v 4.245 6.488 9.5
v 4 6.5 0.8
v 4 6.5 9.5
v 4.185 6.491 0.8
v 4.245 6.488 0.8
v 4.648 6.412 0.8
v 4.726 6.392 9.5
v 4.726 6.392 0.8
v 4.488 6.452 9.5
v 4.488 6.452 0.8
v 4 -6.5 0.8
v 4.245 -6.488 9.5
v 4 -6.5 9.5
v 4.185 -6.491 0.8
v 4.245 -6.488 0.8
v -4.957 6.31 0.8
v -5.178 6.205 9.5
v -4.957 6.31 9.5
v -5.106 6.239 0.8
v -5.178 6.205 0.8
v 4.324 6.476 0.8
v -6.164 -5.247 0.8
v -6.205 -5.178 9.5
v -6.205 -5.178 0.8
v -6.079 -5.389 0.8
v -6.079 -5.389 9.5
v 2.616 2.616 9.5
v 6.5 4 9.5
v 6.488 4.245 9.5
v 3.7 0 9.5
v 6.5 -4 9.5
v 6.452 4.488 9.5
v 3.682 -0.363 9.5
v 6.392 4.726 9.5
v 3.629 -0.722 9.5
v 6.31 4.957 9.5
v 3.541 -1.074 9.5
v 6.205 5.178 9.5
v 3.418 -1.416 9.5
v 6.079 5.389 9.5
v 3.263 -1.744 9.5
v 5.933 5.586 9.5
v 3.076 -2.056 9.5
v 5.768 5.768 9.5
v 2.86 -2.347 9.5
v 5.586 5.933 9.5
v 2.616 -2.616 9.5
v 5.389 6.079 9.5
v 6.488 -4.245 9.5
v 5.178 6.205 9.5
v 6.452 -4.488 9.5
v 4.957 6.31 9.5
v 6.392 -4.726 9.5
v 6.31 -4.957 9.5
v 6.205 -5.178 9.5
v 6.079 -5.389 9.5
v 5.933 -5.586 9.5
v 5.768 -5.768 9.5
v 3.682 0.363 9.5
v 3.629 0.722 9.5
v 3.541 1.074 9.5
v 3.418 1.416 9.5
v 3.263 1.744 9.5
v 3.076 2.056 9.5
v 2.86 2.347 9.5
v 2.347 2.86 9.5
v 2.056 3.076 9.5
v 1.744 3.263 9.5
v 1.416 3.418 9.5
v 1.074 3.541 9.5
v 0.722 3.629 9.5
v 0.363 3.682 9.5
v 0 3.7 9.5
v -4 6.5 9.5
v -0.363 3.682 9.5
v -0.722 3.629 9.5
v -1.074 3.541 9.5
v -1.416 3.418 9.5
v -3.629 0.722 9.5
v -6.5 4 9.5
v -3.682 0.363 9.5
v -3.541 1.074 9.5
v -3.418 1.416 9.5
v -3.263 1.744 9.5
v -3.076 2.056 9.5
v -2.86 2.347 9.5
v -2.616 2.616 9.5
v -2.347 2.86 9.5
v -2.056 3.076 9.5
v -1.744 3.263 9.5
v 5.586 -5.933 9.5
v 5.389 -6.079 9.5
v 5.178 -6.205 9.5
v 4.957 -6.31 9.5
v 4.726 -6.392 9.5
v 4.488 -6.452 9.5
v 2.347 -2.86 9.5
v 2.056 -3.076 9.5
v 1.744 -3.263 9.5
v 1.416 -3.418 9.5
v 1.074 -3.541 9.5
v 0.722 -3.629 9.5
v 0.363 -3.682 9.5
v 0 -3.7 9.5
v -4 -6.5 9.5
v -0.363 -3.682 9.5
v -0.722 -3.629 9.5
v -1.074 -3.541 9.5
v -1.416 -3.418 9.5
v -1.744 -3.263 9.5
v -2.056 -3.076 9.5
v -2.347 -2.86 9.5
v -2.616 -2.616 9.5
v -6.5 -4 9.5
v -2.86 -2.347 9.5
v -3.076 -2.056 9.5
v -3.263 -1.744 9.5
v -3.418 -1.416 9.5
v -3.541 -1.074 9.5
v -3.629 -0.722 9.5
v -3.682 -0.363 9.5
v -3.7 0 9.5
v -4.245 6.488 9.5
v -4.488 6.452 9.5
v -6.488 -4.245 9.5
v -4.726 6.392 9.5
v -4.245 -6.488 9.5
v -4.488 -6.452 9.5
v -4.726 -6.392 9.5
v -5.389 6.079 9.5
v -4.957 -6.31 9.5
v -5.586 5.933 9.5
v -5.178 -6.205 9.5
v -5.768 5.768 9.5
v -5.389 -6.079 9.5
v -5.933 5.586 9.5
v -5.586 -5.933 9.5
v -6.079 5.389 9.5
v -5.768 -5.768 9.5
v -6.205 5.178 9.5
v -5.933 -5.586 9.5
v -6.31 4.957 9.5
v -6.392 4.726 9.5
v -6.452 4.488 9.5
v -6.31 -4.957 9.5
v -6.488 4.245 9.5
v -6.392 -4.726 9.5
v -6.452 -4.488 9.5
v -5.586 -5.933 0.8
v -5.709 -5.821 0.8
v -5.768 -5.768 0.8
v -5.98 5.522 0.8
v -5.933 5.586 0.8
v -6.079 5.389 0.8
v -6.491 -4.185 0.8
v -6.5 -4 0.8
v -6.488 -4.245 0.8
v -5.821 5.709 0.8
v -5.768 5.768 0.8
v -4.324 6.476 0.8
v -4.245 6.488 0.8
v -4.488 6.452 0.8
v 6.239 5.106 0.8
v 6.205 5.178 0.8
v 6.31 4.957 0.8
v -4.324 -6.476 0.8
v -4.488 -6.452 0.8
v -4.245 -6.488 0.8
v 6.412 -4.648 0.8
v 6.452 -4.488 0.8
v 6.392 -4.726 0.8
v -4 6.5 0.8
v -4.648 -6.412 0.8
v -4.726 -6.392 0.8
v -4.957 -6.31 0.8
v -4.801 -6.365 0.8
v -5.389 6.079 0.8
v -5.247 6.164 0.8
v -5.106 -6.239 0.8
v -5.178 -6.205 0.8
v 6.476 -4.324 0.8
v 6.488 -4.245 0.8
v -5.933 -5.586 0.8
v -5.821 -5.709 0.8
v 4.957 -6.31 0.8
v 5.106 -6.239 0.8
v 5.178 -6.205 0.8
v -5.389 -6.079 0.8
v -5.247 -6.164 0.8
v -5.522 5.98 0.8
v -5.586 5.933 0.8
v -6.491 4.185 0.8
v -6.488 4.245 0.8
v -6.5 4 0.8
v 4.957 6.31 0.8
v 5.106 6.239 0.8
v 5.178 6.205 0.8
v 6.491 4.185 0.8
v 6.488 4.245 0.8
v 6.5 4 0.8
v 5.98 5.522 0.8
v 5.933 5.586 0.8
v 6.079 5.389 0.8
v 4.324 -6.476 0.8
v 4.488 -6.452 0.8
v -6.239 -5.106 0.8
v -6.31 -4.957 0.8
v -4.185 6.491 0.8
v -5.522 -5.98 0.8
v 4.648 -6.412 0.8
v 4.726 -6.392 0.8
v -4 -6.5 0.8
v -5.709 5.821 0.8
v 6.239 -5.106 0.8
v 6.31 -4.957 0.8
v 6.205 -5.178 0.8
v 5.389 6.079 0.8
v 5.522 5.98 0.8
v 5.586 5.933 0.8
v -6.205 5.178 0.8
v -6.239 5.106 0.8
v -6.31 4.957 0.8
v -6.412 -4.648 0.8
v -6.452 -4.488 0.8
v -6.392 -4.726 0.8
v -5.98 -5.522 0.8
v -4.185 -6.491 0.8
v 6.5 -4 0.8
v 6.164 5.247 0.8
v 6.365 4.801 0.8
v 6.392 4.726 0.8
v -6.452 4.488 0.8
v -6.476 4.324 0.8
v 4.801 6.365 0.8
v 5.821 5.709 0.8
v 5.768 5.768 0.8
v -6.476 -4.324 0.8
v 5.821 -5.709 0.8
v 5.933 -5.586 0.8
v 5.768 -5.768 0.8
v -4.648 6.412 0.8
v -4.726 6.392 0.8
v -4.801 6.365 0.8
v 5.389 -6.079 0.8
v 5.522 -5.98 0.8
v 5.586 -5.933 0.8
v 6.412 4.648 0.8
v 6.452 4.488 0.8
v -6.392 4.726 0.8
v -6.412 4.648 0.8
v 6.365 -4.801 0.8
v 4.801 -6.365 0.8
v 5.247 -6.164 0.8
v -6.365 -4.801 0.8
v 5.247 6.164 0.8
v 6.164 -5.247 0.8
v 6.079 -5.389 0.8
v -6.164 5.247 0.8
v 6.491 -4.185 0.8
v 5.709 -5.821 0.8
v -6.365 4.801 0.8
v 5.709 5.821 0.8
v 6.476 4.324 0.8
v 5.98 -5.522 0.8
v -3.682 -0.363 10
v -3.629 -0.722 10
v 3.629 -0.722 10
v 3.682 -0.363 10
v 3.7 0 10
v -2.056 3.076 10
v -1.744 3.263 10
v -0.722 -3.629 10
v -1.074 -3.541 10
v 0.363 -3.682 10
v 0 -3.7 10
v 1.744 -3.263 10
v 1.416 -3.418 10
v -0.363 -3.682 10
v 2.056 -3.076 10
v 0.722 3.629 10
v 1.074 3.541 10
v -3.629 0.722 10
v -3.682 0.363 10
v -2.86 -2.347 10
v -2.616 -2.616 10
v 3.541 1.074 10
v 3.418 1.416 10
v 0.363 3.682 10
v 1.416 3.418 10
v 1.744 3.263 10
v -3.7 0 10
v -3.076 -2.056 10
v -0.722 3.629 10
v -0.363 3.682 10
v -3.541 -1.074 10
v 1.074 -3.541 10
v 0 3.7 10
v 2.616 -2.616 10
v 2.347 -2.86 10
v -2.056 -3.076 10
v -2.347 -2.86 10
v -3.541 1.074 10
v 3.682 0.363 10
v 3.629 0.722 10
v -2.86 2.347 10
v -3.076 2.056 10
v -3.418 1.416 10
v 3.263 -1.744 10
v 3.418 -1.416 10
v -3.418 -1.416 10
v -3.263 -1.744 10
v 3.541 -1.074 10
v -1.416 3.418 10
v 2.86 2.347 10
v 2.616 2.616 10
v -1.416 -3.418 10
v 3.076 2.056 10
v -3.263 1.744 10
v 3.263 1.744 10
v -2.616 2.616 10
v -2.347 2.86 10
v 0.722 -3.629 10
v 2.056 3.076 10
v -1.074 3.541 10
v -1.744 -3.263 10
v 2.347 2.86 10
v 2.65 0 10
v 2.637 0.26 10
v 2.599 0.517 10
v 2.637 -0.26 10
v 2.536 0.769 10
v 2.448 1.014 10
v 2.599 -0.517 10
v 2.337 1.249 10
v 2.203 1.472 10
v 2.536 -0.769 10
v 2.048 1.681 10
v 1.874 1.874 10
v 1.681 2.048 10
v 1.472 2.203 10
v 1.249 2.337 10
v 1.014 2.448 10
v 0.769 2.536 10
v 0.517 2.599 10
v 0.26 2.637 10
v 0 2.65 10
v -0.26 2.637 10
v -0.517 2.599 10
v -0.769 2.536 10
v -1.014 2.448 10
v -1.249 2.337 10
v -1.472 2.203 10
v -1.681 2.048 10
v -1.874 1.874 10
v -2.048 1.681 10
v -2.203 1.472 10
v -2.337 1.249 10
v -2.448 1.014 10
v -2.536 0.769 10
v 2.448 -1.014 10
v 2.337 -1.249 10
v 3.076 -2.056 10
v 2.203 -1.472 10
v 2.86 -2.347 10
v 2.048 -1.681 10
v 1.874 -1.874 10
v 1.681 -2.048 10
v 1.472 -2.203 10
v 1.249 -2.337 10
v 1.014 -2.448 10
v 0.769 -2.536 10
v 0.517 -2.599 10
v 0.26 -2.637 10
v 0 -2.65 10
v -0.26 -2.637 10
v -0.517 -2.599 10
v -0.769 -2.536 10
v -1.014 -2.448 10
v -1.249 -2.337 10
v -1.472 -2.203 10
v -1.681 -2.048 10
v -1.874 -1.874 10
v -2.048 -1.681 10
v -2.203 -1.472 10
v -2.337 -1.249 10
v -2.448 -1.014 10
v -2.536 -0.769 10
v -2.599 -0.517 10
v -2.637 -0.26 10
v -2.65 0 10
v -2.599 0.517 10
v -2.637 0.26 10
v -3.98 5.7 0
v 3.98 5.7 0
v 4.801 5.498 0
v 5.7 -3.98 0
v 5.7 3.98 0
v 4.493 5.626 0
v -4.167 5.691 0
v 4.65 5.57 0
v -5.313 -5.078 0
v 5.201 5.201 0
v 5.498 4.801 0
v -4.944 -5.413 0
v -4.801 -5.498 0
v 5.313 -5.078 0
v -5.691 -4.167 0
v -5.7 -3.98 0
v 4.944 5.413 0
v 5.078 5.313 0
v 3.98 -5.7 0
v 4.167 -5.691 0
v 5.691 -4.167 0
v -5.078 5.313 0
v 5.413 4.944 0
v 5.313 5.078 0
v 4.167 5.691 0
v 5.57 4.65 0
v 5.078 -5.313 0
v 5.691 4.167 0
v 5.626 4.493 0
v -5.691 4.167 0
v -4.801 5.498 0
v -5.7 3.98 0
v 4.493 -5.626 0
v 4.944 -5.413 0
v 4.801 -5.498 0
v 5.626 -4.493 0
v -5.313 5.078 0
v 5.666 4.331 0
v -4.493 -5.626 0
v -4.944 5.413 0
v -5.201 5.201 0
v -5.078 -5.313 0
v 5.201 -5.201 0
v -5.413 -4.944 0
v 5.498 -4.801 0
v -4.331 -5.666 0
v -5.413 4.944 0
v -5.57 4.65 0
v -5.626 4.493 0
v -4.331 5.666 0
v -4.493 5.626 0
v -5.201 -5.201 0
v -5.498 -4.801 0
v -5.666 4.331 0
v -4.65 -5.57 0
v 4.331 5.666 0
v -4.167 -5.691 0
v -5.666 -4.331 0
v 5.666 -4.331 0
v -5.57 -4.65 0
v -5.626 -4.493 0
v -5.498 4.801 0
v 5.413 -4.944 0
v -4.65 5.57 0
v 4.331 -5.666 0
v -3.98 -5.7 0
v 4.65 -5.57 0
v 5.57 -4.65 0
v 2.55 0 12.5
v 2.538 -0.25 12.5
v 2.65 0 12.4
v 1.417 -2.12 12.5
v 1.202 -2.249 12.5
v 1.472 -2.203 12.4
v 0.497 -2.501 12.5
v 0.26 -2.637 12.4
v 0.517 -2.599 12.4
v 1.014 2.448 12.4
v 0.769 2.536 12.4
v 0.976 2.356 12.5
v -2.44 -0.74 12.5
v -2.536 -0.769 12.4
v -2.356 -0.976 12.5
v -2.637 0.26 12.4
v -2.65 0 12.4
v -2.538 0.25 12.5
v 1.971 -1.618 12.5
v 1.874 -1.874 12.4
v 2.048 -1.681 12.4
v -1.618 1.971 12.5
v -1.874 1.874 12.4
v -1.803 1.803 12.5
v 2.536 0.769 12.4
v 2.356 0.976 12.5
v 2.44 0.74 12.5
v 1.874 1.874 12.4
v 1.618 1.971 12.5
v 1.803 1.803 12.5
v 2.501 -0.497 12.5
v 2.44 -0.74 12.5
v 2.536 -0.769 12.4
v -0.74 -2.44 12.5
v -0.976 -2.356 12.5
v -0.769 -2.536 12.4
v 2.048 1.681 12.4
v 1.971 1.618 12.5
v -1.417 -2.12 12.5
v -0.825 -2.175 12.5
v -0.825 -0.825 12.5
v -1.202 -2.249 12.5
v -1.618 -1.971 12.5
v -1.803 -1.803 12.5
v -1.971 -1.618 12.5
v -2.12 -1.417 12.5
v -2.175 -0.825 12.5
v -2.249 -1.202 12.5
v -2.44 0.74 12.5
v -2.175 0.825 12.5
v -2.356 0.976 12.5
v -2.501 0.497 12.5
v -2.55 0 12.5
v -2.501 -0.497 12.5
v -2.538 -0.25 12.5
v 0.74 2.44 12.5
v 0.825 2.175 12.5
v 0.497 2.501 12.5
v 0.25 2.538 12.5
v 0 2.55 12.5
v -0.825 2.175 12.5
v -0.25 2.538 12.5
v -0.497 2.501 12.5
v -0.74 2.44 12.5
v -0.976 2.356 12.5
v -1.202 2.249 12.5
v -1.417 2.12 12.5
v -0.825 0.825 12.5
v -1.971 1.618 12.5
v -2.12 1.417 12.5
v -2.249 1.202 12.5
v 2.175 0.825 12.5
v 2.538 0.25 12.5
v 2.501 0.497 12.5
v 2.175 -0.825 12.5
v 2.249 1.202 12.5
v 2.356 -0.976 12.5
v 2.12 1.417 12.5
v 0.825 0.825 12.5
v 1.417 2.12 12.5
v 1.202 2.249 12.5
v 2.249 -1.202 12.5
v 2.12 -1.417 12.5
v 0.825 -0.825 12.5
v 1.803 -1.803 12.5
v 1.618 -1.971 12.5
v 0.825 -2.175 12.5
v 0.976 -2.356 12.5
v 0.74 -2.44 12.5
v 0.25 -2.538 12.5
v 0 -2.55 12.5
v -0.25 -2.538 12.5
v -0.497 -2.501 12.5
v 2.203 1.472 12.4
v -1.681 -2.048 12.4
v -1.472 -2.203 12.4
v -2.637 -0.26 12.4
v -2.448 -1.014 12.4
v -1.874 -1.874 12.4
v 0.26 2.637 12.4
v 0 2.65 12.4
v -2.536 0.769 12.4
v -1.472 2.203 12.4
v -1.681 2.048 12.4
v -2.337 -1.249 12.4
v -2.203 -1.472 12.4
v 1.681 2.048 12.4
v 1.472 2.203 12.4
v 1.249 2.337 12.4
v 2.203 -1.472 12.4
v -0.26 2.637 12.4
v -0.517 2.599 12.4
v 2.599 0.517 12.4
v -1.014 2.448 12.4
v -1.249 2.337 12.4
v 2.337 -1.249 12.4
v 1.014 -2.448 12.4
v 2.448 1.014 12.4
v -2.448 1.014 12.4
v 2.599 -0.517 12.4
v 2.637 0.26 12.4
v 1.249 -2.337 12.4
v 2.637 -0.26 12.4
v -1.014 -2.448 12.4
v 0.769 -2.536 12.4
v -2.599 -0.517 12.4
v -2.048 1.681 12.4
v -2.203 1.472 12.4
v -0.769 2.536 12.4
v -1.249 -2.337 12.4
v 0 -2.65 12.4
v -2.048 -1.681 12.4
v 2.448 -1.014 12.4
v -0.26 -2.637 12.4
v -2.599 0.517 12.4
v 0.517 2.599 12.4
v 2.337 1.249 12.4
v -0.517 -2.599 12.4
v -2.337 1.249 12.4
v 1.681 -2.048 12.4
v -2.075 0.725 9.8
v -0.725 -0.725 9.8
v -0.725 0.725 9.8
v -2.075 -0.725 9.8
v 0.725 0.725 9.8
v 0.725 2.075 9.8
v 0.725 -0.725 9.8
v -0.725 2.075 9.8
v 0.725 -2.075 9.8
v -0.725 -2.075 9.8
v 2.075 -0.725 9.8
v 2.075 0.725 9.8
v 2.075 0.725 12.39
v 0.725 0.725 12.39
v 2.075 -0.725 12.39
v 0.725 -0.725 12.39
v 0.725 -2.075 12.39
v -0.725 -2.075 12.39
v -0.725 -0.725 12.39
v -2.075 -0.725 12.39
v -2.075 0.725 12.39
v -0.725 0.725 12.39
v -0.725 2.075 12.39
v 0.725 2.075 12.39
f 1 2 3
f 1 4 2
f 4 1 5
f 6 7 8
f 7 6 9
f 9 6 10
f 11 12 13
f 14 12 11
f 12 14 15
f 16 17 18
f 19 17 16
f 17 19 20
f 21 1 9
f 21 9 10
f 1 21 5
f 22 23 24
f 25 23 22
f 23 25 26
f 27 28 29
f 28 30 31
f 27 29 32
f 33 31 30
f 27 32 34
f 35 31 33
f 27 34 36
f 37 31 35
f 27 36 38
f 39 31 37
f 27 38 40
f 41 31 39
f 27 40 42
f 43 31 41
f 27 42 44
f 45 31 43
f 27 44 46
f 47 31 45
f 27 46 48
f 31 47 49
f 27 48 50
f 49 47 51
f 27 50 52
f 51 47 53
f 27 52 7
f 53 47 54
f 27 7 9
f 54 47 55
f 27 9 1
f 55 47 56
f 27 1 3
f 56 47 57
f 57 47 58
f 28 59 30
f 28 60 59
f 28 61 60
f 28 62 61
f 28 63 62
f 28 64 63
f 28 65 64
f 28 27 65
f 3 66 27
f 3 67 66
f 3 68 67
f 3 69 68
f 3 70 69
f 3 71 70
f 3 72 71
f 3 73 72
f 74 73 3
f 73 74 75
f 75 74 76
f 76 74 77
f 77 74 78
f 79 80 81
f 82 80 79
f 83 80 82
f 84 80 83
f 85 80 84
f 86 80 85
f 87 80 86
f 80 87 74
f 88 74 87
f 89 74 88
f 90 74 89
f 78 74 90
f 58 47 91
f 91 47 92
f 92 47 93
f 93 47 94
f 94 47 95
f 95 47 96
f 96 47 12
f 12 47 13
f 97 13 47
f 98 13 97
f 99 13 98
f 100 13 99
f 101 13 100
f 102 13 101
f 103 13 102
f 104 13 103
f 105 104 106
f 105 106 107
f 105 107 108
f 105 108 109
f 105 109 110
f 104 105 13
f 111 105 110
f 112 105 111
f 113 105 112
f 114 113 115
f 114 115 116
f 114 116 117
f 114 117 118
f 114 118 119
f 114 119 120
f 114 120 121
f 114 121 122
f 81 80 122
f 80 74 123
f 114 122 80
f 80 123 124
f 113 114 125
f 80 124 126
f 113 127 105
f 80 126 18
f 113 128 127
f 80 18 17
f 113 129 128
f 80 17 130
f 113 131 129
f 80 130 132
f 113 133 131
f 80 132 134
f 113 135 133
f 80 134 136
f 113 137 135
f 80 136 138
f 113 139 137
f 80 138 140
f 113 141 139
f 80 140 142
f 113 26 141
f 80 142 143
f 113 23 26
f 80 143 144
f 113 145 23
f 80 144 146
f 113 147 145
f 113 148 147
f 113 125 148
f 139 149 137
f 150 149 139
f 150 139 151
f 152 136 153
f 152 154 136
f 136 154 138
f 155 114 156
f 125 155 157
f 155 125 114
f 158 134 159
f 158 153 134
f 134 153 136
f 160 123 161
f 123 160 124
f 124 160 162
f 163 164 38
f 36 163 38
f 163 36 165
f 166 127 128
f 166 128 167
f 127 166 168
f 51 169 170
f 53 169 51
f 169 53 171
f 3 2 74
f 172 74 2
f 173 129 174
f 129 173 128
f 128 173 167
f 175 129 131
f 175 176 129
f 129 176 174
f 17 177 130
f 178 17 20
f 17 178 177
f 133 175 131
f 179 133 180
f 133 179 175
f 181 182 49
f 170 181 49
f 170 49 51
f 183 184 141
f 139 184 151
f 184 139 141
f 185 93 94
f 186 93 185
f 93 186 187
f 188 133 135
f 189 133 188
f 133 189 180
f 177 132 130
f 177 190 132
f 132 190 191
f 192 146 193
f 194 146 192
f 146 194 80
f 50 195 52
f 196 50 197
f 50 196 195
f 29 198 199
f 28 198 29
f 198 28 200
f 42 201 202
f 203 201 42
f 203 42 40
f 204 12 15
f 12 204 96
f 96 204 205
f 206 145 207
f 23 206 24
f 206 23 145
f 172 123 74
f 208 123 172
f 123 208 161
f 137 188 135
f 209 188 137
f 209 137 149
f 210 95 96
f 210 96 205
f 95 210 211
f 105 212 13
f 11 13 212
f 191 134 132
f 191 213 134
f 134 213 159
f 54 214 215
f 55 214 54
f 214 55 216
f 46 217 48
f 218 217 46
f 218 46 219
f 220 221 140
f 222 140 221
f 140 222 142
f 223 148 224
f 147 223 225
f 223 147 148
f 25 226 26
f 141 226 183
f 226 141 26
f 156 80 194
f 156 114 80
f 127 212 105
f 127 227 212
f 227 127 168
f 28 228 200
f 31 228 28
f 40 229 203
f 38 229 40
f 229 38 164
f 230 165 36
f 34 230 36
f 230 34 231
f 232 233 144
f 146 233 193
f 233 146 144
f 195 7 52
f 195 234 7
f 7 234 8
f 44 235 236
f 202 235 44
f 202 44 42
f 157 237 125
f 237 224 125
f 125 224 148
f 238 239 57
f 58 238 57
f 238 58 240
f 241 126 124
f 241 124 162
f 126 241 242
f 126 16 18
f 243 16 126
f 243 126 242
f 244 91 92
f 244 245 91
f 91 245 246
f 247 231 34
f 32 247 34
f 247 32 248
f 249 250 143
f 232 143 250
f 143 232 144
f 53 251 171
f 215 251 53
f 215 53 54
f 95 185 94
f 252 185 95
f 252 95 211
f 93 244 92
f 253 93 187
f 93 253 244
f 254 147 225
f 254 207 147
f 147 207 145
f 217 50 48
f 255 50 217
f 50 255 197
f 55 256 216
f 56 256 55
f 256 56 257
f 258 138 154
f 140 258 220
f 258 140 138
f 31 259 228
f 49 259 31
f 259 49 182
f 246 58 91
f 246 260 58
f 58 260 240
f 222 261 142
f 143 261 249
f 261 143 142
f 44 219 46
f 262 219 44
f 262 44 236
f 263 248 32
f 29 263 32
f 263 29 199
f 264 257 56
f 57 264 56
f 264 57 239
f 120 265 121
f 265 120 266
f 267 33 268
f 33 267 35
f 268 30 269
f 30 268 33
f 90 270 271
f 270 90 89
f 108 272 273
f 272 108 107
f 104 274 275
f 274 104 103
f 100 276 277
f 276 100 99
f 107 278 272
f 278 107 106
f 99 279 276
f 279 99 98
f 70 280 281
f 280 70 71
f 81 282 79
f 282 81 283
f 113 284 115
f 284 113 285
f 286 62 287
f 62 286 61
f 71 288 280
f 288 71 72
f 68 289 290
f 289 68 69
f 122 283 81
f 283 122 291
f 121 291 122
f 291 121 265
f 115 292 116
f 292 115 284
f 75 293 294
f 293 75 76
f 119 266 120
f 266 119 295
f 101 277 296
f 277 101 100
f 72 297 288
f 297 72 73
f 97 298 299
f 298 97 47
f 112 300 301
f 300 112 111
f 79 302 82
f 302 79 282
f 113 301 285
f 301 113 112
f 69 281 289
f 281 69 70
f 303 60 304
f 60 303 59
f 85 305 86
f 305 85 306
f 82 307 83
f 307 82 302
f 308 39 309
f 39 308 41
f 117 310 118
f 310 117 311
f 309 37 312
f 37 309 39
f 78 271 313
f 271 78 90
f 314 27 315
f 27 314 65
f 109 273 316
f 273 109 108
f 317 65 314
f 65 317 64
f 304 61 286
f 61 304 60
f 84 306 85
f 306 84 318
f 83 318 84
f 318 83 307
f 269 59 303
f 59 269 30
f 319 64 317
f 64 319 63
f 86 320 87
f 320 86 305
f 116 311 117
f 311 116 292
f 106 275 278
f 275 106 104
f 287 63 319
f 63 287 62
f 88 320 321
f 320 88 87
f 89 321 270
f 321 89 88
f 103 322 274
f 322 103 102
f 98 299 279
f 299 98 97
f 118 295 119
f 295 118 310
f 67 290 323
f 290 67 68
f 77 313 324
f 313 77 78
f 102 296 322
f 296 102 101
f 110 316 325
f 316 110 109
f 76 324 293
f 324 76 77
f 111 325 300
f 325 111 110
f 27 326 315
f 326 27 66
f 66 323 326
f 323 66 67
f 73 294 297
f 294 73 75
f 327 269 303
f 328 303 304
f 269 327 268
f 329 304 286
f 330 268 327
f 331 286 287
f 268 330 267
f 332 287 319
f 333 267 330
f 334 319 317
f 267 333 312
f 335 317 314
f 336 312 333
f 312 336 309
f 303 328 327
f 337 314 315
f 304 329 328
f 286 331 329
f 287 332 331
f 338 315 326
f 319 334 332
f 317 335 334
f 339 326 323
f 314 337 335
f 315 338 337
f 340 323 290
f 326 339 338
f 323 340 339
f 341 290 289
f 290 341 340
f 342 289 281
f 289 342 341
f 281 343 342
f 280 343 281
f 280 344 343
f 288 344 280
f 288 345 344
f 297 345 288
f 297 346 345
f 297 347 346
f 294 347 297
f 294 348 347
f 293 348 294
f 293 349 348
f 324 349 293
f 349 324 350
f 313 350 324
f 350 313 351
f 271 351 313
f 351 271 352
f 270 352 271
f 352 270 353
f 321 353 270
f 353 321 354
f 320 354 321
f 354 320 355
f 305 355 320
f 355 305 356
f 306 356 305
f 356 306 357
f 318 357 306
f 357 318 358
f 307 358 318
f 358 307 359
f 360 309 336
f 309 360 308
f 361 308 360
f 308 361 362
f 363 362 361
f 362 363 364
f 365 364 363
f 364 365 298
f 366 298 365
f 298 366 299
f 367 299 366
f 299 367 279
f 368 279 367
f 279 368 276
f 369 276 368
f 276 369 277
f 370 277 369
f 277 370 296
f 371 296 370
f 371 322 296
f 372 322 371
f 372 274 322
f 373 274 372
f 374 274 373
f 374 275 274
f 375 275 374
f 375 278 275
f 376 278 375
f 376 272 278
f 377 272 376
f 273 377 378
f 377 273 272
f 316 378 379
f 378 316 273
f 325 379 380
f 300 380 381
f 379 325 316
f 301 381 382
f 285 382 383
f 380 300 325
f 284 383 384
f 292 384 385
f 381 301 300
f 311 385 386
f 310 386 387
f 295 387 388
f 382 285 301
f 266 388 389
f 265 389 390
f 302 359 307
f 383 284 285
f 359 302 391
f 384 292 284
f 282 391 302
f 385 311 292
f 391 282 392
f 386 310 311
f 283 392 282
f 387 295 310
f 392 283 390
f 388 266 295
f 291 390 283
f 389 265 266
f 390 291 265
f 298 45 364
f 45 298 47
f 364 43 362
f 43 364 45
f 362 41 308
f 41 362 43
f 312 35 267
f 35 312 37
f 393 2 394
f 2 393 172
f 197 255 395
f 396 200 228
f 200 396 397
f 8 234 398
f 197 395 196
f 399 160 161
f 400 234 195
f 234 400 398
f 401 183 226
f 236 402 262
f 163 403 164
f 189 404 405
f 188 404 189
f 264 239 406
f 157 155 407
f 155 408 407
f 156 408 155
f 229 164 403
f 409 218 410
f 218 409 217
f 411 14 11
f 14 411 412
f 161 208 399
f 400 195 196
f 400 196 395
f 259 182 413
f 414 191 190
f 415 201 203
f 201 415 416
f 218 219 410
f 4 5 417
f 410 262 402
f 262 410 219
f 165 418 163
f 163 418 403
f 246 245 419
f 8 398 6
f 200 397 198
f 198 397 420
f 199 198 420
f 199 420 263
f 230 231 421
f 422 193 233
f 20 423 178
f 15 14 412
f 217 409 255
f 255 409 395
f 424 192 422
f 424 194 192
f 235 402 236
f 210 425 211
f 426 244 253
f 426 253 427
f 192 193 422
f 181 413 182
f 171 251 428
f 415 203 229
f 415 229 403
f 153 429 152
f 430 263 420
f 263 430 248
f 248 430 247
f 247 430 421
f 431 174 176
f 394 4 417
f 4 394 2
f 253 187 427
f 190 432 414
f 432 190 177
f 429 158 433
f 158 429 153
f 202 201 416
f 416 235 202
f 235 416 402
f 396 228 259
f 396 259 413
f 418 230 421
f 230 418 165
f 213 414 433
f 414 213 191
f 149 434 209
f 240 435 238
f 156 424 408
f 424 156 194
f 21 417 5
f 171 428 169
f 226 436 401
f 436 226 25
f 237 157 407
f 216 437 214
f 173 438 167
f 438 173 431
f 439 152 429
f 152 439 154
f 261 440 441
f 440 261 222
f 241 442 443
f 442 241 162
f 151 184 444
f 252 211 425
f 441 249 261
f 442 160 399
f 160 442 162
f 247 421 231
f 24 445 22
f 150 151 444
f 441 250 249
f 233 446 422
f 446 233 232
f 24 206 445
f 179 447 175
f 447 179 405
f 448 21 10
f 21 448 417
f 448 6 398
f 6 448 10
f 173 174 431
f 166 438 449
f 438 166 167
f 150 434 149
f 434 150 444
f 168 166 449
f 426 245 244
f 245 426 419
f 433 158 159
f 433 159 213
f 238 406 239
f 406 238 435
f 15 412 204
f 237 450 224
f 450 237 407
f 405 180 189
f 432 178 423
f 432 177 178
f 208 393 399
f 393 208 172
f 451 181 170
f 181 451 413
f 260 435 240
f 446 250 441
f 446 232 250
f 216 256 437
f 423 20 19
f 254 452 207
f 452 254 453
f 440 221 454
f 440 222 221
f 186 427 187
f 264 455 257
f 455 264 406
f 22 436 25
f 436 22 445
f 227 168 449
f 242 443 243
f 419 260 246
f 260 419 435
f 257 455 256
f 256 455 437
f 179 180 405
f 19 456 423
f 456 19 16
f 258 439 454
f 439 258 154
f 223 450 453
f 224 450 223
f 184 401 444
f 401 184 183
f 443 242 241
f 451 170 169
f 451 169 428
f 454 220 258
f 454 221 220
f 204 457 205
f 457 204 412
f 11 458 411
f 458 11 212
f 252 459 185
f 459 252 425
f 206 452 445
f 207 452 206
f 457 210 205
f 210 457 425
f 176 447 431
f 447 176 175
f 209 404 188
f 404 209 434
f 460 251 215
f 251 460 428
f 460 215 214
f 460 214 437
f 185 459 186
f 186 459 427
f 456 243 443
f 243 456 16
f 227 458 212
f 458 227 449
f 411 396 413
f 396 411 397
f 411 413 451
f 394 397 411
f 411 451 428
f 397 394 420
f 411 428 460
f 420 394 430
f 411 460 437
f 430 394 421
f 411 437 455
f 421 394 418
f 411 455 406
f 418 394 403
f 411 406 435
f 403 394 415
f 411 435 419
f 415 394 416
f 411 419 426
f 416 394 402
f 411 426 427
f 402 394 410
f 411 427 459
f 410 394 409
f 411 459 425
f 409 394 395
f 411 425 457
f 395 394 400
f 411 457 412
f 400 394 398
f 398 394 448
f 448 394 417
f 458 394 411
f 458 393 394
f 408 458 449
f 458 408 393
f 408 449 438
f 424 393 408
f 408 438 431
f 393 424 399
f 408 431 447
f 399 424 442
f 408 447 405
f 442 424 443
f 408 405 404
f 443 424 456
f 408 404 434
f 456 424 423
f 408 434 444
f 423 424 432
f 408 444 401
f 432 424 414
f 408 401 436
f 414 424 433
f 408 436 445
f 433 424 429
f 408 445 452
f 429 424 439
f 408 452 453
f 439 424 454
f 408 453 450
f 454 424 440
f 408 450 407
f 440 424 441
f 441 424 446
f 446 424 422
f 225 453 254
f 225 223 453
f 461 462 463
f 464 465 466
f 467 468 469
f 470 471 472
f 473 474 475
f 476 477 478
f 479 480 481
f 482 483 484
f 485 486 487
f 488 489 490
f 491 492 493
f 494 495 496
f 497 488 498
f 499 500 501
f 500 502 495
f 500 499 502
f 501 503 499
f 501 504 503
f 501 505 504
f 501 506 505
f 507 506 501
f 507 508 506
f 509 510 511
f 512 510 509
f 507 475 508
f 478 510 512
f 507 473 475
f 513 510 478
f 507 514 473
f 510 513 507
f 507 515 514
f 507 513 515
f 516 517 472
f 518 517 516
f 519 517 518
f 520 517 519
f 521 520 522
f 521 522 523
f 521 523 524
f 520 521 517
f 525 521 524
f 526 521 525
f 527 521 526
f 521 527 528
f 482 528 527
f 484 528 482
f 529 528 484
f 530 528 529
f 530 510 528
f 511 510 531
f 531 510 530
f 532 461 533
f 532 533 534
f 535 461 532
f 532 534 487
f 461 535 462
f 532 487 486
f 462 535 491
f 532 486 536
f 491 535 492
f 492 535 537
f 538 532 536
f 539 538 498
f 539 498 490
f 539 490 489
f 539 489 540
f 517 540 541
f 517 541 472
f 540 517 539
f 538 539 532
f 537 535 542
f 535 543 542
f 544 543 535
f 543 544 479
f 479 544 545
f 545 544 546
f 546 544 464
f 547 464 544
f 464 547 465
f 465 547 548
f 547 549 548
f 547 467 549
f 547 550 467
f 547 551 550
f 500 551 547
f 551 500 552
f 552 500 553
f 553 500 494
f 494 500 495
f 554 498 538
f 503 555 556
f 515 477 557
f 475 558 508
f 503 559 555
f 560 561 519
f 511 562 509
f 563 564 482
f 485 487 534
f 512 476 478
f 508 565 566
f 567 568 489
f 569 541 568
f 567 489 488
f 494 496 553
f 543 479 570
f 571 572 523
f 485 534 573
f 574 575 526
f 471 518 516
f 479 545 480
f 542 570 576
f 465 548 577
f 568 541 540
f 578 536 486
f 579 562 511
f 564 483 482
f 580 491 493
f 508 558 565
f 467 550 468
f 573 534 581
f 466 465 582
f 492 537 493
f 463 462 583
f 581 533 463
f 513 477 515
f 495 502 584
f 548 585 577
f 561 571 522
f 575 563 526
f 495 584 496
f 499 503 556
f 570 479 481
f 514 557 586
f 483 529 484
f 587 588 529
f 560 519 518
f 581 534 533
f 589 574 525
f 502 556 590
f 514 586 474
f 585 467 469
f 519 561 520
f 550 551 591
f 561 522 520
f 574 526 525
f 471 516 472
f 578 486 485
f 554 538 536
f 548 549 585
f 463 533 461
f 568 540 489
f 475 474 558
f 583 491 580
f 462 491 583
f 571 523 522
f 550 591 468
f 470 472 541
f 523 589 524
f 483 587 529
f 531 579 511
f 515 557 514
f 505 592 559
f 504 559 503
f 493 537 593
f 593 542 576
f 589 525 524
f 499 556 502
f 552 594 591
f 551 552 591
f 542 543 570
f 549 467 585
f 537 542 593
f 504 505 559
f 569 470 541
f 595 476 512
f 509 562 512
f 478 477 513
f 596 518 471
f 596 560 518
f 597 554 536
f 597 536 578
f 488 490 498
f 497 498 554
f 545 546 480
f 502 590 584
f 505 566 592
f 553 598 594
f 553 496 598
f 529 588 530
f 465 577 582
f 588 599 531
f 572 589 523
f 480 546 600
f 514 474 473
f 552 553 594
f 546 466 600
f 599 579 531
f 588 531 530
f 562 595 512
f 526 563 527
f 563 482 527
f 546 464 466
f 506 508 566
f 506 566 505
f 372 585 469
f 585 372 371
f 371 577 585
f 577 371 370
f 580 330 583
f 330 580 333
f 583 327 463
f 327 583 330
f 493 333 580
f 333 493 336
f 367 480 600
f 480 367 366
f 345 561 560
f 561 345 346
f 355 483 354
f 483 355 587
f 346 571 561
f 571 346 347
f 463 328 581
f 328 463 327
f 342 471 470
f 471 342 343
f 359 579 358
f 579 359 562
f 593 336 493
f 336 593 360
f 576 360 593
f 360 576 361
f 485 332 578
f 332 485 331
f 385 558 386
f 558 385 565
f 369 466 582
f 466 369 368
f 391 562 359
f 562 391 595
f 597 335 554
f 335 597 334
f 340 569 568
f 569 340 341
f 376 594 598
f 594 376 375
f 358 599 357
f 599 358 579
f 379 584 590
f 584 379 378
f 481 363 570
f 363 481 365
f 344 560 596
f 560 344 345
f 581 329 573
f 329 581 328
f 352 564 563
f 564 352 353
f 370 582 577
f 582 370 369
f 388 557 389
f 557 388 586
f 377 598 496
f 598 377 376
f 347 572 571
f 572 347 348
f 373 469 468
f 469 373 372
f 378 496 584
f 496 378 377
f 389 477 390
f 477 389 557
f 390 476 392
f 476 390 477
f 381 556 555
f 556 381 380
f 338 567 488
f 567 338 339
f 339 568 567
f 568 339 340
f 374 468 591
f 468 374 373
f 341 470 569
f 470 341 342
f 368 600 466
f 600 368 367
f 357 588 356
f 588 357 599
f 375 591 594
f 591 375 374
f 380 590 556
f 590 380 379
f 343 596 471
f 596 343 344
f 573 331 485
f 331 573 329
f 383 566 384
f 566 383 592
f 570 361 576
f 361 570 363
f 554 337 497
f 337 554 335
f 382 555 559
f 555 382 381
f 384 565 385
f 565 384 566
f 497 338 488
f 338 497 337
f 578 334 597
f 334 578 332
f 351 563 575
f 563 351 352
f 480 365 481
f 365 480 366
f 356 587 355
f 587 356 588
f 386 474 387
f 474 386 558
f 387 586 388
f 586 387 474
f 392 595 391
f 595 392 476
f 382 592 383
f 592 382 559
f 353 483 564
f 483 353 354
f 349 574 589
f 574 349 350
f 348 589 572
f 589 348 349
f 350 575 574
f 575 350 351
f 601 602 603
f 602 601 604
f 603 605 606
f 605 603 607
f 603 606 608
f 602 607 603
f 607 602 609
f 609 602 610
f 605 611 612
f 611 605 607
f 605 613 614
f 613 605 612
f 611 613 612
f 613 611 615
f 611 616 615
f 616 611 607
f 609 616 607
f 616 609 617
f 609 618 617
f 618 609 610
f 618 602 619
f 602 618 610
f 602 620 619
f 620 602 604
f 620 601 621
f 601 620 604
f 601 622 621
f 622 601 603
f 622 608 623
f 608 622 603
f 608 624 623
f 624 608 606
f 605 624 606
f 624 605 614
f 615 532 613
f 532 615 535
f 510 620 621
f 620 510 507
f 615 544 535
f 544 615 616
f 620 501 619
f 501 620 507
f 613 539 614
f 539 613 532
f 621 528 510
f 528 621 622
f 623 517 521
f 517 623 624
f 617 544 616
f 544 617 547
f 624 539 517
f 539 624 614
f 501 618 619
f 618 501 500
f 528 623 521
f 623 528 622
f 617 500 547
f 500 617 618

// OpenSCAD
// Choc v2 tower keycap -- a tall rounded block that sits straight on a Kailh
// Choc v2 (PG1353) stem, no MX adapter in between. The top face can be
// angled by `tilt` degrees, sloping down toward the compass direction
// `azimuth`, so a tower can face the finger that presses it.
//
// Printed top face down on the bed: the face comes out flat and smooth, the
// edge chamfer is a 45 degree slope, the sides lean at most `tilt` from
// vertical and the socket points straight up. Nothing needs supports.
//
// As with the tilter, the cross only engages every 90 degrees, so the slope
// direction is built into the part:
//
//   azimuth=0   turned 0/90/180/270 on the switch -> the four square slopes
//   azimuth=45  turned 0/90/180/270 on the switch -> the four diagonal slopes
//
// Select with -D height=11 -D tilt=15 -D azimuth=45.

height  = 10;         // top face height at the centre, above the rim seat
tilt    = 0;          // degrees the top face slopes; 0 leaves it flat
azimuth = 0;          // which way it slopes down, degrees CCW from +x
print   = true;       // true: top face down on the bed; false: as fitted

// ---------------------------------------------------------------------------
// Body -- Kagu's switches sit on an 18 x 17 grid, so 13 leaves a 4 mm gap to
// the next row, wide enough to feel each tower on its own.
// ---------------------------------------------------------------------------
size    = 13;         // square footprint
size_r  = 2.5;        // corner radius of the footprint
chamfer = 0.8;        // 45 degree chamfer round the top face

// ---------------------------------------------------------------------------
// Switch side -- same socket as choc_v2_tilter.scad; see the datasheet notes
// there. The boss drops into the annular slot of the v2 stem tube and the
// body underside lands on the tube rim.
// ---------------------------------------------------------------------------
stem_bore  = 5.50;    // bore the boss drops into
cross_l    = 4.00;    // cross arm span      (datasheet 2-4.00 +/-0.05)
cross_w    = 1.30;    // cross arm width     (datasheet 2-1.30 +/-0.03)

boss_h     = 2.50;    // how far the boss reaches into the slot (3.52 available)
boss_fit   = 0.20;    // boss diameter under the bore
socket_fit = 0.15;    // added to both cross dimensions of the hole
cross_over = 0.20;    // hole past the shoulder, so the rim seats before the cross
lead_in    = 0.10;    // chamfer on the socket mouth and on the boss tip

// The rim seat leaves 0.10 above the housing at bottom-out. The tilter's
// body never left the stem; this one covers most of the housing, so outside
// a ring round the stem the underside steps up by `relief` for margin.
seat_d     = 7.40;    // flat ring that lands on the ø6.50 rim
relief     = 0.50;    // underside step outside the seat

$fn = 64;
eps = 0.01;
big = 100;

// ---------------------------------------------------------------------------
// Derived
// ---------------------------------------------------------------------------
boss_d   = stem_bore - boss_fit;
hole_l   = cross_l + socket_fit;
hole_w   = cross_w + socket_fit;
hole_top = cross_over;              // cross hole roof, above the rim seat

// How far the footprint reaches along the slope direction; the face is
// lowest there.
reach = (size / 2 - size_r) * (abs(cos(azimuth)) + abs(sin(azimuth))) + size_r;
low_z = height - reach * tan(tilt);

echo(str("height=", height, " tilt=", tilt, " azimuth=", azimuth,
         " -> low side ", low_z, " mm, high side ", height + reach * tan(tilt), " mm"));
assert(low_z - chamfer > relief + 1, "tilt too steep for this height");

// ---------------------------------------------------------------------------
// Profiles
// ---------------------------------------------------------------------------
module cross_2d(l, w) {
    square([l, w], center = true);
    square([w, l], center = true);
}

module footprint_2d() { offset(r = size_r) square(size - 2 * size_r, center = true); }

// The footprint as the sloped face cuts it: stretched along the slope.
module face_2d() {
    rotate(azimuth) scale([1 / cos(tilt), 1]) rotate(-azimuth) footprint_2d();
}

// Tip +z over toward `azimuth`, by turning about the horizontal axis square to
// it. Applied to the top face only -- the sides stay square to the switch.
module lean() {
    rotate(a = tilt, v = [-sin(azimuth), cos(azimuth), 0]) children();
}

// Into the face frame: origin on the face centre, +z out of the face.
module on_face() { translate([0, 0, height]) lean() children(); }

// Everything below the face, with the edge chamfered at 45 degrees to it.
module under_face() {
    on_face() hull() {
        translate([0, 0, -eps]) linear_extrude(eps) offset(delta = -chamfer) face_2d();
        translate([0, 0, -big]) linear_extrude(eps) offset(delta = big - chamfer) face_2d();
    }
}

// ---------------------------------------------------------------------------
// Parts
// ---------------------------------------------------------------------------
module body() {
    intersection() {
        union() {
            translate([0, 0, relief]) linear_extrude(big) footprint_2d();
            linear_extrude(relief + eps) circle(d = seat_d);
        }
        under_face();
    }
}

// Boss that drops into the annular slot, built down from the rim seat.
module boss() {
    translate([0, 0, -boss_h]) {
        cylinder(d1 = boss_d - 2 * lead_in, d2 = boss_d, h = lead_in);
        translate([0, 0, lead_in]) cylinder(d = boss_d, h = boss_h - lead_in + eps);
    }
}

module bar_mouth(l, w) {
    hull() {
        translate([0, 0, -eps]) linear_extrude(eps)
            square([l + 2 * lead_in, w + 2 * lead_in], center = true);
        translate([0, 0, lead_in]) linear_extrude(eps) square([l, w], center = true);
    }
}

module cross_hole() {
    translate([0, 0, -boss_h]) {
        translate([0, 0, -eps]) linear_extrude(boss_h + hole_top + eps) cross_2d(hole_l, hole_w);
        bar_mouth(hole_l, hole_w);
        rotate([0, 0, 90]) bar_mouth(hole_l, hole_w);
    }
}

module tower() {
    difference() {
        union() {
            body();
            boss();
        }
        cross_hole();
    }
}

// ---------------------------------------------------------------------------
// Assembly
// ---------------------------------------------------------------------------
if (print)
    // Undo the lean, put the face on z=0 and turn it over.
    rotate([180, 0, 0]) rotate(a = -tilt, v = [-sin(azimuth), cos(azimuth), 0])
        translate([0, 0, -height]) tower();
else
    tower();
